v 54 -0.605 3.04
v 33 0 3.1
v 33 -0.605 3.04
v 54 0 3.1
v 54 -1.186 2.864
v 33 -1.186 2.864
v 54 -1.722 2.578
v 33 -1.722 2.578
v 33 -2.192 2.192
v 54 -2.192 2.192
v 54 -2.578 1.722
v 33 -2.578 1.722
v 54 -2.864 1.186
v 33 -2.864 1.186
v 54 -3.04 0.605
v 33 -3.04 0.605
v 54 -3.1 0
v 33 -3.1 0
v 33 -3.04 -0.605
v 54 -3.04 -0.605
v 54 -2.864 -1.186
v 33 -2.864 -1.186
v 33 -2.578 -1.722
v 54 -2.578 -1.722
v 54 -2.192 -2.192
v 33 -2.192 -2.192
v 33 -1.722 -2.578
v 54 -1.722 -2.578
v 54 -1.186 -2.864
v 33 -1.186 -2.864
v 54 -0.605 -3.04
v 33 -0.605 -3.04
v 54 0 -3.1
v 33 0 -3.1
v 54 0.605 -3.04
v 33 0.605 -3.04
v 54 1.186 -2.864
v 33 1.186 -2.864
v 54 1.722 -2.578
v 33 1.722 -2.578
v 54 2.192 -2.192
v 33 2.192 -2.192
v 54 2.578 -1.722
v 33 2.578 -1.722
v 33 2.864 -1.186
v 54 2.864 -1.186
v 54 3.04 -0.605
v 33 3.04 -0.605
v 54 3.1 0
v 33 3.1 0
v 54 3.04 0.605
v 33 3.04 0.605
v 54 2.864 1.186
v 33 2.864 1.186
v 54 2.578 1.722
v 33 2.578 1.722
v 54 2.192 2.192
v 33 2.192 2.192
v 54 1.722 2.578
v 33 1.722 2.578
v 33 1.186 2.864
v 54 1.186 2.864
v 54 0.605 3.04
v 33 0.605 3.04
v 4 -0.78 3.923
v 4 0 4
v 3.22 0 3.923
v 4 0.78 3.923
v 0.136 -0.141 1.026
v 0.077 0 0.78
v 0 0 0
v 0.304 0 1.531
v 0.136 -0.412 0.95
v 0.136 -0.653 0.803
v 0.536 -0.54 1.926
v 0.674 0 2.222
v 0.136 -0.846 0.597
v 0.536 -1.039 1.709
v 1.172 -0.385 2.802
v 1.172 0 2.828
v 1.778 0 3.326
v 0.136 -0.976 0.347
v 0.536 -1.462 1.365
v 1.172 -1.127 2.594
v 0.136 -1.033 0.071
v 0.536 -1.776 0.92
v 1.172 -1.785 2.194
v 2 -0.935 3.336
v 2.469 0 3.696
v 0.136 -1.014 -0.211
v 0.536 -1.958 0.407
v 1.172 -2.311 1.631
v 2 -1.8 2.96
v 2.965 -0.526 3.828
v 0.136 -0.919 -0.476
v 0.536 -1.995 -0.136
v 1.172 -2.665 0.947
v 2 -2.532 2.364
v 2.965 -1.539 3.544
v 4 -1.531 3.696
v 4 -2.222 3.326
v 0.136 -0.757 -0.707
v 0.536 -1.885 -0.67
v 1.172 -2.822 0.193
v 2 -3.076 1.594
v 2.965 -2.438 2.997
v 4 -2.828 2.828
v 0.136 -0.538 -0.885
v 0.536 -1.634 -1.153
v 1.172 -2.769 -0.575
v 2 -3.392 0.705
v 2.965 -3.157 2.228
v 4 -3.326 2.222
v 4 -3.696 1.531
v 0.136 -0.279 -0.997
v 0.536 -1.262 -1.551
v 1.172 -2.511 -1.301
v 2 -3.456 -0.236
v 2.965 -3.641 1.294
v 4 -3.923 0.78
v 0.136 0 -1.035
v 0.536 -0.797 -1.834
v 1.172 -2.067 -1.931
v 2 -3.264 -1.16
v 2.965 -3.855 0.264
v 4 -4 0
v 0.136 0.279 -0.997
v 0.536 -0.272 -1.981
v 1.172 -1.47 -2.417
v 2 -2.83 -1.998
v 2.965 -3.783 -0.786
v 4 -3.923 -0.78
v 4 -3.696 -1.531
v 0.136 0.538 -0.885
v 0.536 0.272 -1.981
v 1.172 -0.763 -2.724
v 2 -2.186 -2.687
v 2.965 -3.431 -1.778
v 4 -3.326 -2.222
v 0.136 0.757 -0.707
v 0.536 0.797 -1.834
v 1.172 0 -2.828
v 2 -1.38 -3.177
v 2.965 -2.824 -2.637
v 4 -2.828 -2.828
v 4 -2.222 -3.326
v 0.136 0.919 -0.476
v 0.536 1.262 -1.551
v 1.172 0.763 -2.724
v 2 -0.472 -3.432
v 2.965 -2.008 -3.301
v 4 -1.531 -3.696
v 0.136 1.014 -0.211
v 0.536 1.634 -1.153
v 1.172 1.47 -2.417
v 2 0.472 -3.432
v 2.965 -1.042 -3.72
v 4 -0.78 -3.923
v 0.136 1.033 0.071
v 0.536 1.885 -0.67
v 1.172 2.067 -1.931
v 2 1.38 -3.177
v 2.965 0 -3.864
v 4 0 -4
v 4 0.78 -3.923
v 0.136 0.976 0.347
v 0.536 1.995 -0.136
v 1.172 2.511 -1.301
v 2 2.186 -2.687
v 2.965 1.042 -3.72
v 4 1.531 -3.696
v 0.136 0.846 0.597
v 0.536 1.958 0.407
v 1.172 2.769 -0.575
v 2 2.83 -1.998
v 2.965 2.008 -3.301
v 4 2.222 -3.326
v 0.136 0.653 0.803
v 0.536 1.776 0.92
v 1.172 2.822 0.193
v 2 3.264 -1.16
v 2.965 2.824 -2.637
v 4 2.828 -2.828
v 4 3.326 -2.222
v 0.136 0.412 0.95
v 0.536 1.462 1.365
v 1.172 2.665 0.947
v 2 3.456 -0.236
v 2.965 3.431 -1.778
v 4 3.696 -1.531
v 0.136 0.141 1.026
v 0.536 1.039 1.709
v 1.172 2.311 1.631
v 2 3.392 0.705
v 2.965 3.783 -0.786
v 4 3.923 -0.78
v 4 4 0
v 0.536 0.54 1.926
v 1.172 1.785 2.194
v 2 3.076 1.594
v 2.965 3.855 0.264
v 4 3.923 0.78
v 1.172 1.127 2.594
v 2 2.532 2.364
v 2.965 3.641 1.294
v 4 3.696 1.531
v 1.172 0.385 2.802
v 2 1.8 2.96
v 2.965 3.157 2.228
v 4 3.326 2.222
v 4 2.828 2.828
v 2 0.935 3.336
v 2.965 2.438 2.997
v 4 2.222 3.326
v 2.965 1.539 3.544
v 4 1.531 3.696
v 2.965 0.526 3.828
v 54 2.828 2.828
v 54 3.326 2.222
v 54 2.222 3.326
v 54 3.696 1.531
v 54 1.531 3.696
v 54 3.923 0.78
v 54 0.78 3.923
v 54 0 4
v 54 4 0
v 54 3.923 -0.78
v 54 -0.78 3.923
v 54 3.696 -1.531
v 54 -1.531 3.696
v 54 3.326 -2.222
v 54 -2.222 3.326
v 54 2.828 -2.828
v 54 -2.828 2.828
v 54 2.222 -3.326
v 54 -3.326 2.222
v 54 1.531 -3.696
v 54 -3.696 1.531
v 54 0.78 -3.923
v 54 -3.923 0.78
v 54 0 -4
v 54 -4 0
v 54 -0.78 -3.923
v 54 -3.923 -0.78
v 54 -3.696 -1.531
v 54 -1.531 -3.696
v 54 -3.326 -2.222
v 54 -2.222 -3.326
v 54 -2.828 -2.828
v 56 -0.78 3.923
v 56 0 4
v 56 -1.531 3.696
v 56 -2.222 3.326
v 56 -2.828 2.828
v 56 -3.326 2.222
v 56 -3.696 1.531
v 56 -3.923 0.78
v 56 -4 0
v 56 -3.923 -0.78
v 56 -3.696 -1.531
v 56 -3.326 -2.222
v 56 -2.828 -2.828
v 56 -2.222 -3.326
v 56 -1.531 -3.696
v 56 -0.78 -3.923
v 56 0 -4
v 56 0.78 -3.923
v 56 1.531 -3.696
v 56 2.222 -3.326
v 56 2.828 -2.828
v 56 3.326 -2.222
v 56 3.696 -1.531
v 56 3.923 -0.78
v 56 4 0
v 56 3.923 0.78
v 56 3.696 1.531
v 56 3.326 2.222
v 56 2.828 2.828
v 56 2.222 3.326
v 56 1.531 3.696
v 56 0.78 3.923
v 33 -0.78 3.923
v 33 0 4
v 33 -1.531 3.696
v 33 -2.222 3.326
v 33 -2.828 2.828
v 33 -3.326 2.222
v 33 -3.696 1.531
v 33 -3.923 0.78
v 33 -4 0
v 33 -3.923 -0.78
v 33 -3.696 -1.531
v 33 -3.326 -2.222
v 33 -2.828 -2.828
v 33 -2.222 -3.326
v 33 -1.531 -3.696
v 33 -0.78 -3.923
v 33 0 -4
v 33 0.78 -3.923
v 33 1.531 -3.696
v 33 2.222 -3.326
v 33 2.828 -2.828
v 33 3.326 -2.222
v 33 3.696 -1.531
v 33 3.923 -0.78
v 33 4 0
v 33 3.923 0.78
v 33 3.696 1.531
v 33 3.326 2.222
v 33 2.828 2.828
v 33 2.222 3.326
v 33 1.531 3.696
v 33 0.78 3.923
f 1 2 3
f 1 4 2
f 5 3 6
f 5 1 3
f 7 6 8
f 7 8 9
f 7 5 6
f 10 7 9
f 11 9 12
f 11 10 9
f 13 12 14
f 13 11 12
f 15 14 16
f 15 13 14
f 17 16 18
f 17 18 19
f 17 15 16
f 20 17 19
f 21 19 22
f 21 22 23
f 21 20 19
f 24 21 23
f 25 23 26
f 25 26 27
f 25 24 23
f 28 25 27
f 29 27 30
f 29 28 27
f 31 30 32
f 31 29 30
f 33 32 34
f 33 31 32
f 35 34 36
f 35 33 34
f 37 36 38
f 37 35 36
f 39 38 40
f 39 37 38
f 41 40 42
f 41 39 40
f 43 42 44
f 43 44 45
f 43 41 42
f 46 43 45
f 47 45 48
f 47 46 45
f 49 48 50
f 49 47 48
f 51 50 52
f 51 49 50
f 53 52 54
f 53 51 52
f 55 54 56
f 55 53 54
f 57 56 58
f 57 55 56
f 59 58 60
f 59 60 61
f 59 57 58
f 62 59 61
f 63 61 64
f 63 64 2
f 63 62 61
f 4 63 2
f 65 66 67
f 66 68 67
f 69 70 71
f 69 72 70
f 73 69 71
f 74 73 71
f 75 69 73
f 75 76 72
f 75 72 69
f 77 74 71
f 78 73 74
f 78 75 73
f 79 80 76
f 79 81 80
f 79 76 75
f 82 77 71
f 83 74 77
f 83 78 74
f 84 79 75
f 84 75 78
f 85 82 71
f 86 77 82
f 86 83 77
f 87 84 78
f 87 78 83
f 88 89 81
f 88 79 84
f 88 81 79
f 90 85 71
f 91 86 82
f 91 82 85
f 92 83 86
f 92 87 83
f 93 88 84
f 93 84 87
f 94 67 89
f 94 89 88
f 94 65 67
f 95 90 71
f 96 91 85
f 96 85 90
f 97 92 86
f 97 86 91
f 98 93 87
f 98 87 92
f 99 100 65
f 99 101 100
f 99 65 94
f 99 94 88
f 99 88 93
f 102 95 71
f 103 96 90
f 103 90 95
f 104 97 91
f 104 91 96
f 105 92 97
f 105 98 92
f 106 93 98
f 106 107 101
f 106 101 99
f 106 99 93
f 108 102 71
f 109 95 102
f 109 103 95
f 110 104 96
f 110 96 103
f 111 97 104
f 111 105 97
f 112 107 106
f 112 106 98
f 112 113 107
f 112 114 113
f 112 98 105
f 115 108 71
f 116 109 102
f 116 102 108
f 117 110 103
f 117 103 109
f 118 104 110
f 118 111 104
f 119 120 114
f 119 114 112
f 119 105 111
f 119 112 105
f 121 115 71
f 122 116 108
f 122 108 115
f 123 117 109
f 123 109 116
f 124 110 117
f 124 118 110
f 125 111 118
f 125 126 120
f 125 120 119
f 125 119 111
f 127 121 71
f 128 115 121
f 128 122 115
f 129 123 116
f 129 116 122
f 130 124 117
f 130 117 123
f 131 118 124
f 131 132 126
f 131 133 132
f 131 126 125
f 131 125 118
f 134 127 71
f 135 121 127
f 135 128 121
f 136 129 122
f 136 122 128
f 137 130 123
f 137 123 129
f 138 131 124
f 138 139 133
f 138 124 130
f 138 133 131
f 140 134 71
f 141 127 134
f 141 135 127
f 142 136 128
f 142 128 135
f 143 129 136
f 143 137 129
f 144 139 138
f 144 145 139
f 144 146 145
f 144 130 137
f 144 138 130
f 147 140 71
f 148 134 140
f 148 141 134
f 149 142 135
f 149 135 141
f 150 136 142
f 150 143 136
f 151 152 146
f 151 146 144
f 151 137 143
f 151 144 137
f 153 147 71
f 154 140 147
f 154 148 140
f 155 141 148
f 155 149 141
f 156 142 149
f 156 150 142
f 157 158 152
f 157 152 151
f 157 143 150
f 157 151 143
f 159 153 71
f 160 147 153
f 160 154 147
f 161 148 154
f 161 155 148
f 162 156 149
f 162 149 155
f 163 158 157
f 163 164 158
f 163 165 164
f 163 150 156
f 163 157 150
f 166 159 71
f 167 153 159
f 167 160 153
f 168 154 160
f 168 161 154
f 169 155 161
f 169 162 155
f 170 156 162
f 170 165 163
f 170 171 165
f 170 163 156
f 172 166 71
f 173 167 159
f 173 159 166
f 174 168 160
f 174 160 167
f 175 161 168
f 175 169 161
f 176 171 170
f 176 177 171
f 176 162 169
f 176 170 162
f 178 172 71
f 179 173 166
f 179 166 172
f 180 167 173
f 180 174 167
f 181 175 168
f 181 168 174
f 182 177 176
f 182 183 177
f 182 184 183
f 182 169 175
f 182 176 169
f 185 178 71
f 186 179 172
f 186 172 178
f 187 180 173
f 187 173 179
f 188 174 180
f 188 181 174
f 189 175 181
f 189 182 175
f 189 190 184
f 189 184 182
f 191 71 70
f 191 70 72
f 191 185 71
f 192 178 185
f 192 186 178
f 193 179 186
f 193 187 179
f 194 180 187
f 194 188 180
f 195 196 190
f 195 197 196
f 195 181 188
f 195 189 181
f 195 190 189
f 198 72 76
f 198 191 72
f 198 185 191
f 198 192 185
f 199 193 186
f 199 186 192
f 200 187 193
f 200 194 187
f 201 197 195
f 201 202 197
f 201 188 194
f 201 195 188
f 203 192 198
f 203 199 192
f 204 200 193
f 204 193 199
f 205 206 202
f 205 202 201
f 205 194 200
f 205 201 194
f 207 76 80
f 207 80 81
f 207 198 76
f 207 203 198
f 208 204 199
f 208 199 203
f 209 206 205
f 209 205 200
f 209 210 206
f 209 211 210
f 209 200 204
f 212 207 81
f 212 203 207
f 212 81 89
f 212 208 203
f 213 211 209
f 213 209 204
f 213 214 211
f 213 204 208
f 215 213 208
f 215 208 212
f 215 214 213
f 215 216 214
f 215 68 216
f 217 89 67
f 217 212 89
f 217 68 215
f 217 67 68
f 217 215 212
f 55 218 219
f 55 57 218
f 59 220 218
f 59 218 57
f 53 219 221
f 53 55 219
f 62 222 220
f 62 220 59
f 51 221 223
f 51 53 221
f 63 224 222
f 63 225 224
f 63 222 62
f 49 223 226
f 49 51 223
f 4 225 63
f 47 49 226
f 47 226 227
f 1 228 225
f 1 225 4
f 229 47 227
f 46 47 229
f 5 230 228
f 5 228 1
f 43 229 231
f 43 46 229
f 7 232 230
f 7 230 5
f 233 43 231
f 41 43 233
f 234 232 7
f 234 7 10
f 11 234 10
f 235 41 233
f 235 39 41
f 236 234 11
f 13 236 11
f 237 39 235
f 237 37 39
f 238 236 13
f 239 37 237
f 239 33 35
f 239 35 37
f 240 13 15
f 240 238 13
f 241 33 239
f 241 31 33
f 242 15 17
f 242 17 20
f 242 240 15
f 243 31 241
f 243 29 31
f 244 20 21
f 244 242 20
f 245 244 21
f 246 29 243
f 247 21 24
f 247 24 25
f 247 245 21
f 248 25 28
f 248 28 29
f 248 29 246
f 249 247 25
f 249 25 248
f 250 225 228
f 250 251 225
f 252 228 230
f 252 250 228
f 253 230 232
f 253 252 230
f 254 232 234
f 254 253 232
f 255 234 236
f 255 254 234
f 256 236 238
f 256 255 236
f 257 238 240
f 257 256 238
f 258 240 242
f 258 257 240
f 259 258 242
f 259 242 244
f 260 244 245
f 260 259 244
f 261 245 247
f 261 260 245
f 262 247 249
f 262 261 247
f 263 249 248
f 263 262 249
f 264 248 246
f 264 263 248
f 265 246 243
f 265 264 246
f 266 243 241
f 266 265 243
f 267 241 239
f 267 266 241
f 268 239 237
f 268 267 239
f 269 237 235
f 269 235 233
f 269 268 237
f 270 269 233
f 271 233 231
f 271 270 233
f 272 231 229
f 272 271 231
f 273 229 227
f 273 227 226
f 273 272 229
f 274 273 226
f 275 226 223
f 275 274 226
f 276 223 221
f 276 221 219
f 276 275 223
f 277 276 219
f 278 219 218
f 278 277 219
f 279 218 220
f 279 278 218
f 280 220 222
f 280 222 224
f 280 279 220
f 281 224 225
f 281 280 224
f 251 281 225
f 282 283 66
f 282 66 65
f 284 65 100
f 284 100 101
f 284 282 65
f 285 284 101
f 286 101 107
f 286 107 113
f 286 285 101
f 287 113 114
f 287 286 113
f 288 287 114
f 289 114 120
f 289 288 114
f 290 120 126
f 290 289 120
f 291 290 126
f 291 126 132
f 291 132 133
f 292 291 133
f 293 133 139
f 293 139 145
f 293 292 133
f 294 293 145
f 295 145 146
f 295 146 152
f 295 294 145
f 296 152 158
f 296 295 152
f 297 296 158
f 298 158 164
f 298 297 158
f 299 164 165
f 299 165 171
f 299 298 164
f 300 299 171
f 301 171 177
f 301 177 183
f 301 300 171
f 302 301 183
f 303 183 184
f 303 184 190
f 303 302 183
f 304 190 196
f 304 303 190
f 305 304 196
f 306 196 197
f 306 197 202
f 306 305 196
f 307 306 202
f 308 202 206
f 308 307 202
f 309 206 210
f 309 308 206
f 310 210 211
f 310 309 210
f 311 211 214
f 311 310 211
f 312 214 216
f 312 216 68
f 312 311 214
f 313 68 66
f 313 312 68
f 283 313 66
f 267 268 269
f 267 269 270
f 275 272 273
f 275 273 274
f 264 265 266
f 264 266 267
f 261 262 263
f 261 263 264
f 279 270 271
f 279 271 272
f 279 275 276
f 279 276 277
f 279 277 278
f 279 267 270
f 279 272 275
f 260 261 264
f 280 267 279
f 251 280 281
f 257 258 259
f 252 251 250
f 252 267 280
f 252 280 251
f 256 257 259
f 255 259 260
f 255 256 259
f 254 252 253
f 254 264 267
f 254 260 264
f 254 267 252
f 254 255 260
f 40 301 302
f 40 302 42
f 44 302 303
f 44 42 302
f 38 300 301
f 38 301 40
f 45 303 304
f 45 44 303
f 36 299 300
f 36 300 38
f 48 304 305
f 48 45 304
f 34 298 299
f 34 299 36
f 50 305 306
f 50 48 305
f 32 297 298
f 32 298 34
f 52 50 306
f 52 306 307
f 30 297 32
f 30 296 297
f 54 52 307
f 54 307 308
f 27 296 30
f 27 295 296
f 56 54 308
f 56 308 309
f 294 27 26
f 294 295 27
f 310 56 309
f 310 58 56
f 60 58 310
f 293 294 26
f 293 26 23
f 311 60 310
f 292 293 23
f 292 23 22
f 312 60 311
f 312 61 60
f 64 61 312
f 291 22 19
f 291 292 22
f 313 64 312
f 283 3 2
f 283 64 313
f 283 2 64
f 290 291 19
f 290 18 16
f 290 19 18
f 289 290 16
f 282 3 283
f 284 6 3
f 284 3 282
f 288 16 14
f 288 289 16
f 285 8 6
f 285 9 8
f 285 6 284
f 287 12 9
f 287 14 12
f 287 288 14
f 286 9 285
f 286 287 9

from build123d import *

# Parameters (mm, degrees)
FILLET1_R = 4


with BuildPart() as part:
    # Sketch1 → Revolve1 (revolve)
    with BuildSketch(Plane.XY, mode=Mode.PRIVATE) as revolve1_sk:
        Polygon((0, 0), (0, 4), (33, 4), (33, 3.1), (54, 3.1), (54, 4), (56, 4), (56, 0), align=None)
    revolve(revolve1_sk.sketch.rotate(Axis((0, 0, 0), (1, 0, 0)), 90), axis=Axis((0, 0, 0), (1, 0, 0)))  # turned: the seam where the file's is

    # Fillet1
    fillet1_edges = [part.edges().sort_by_distance(p)[0] for p in [
        (0, 0, -4),
    ]]
    fillet(fillet1_edges, radius=FILLET1_R)


solid = part.part
